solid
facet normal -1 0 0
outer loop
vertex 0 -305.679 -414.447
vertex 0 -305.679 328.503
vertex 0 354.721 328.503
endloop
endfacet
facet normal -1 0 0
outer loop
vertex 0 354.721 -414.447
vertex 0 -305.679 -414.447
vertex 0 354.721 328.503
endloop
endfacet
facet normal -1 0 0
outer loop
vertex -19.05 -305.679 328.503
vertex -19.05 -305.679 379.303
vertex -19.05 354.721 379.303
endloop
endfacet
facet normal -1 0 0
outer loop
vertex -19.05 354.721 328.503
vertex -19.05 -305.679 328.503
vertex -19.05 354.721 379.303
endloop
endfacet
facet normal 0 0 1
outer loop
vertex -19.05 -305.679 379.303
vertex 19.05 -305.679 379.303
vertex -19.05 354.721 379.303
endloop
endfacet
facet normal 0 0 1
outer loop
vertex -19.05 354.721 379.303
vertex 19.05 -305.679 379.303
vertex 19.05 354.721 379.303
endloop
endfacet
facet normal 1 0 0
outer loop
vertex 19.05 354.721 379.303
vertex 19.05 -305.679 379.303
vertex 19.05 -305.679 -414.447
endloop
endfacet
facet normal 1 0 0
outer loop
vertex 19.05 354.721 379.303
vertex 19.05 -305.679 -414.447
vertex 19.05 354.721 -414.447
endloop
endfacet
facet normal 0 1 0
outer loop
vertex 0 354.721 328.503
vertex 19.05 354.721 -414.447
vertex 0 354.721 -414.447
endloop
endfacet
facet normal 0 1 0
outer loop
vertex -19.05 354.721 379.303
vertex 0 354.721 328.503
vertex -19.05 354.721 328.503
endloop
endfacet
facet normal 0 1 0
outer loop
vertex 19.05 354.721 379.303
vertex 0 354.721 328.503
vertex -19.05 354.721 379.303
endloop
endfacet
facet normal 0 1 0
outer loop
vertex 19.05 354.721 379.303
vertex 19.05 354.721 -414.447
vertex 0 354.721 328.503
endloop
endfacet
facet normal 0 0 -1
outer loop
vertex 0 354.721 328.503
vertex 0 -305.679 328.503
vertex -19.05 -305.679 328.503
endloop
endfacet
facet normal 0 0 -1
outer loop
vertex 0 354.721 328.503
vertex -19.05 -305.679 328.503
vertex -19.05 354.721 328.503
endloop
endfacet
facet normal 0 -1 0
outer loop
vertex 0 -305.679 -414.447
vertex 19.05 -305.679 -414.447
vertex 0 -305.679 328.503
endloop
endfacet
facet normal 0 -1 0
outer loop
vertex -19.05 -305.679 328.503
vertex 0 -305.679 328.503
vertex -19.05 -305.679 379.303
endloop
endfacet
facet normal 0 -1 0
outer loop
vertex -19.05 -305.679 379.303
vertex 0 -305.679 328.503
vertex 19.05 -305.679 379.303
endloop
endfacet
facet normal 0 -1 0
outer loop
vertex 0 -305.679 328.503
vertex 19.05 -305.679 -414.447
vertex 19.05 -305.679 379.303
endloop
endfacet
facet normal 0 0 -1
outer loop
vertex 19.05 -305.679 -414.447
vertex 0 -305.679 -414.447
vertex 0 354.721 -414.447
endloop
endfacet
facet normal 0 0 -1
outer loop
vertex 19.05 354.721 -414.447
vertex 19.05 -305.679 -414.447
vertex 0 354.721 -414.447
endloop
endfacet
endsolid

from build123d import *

# Parameters (mm, degrees)
F0_W     = 660.4
F0_H     = 50.8
F1_DEPTH = 19.05
F2_DEPTH = 19.05
F0_H_2   = 742.95
F3_DEPTH = 19.05


with BuildPart() as f1:
    # F0 (on Right) → F1 (new body)
    with BuildSketch(Plane.YZ):
        with Locations((24.521003, 353.902827)):
            Rectangle(F0_W, F0_H)
    extrude(amount=F1_DEPTH)



with BuildPart() as f2:
    # F0 (on Right) → F2 (new body)
    with BuildSketch(Plane.YZ):
        with Locations((24.521003, 353.902827)):
            Rectangle(F0_W, F0_H)
    extrude(amount=-F2_DEPTH)


with BuildPart() as f1_1:
    add(f1.part)

    add(f2.part)  # F3 merges F2
    # F0 (on Right) → F3 (join)
    with BuildSketch(Plane.YZ):
        with Locations((24.521003, 353.902827)):
            Rectangle(F0_W, F0_H)
        with Locations((24.521003, -42.972173)):
            Rectangle(F0_W, F0_H_2)
    extrude(amount=F3_DEPTH)


solid = f1_1.part
